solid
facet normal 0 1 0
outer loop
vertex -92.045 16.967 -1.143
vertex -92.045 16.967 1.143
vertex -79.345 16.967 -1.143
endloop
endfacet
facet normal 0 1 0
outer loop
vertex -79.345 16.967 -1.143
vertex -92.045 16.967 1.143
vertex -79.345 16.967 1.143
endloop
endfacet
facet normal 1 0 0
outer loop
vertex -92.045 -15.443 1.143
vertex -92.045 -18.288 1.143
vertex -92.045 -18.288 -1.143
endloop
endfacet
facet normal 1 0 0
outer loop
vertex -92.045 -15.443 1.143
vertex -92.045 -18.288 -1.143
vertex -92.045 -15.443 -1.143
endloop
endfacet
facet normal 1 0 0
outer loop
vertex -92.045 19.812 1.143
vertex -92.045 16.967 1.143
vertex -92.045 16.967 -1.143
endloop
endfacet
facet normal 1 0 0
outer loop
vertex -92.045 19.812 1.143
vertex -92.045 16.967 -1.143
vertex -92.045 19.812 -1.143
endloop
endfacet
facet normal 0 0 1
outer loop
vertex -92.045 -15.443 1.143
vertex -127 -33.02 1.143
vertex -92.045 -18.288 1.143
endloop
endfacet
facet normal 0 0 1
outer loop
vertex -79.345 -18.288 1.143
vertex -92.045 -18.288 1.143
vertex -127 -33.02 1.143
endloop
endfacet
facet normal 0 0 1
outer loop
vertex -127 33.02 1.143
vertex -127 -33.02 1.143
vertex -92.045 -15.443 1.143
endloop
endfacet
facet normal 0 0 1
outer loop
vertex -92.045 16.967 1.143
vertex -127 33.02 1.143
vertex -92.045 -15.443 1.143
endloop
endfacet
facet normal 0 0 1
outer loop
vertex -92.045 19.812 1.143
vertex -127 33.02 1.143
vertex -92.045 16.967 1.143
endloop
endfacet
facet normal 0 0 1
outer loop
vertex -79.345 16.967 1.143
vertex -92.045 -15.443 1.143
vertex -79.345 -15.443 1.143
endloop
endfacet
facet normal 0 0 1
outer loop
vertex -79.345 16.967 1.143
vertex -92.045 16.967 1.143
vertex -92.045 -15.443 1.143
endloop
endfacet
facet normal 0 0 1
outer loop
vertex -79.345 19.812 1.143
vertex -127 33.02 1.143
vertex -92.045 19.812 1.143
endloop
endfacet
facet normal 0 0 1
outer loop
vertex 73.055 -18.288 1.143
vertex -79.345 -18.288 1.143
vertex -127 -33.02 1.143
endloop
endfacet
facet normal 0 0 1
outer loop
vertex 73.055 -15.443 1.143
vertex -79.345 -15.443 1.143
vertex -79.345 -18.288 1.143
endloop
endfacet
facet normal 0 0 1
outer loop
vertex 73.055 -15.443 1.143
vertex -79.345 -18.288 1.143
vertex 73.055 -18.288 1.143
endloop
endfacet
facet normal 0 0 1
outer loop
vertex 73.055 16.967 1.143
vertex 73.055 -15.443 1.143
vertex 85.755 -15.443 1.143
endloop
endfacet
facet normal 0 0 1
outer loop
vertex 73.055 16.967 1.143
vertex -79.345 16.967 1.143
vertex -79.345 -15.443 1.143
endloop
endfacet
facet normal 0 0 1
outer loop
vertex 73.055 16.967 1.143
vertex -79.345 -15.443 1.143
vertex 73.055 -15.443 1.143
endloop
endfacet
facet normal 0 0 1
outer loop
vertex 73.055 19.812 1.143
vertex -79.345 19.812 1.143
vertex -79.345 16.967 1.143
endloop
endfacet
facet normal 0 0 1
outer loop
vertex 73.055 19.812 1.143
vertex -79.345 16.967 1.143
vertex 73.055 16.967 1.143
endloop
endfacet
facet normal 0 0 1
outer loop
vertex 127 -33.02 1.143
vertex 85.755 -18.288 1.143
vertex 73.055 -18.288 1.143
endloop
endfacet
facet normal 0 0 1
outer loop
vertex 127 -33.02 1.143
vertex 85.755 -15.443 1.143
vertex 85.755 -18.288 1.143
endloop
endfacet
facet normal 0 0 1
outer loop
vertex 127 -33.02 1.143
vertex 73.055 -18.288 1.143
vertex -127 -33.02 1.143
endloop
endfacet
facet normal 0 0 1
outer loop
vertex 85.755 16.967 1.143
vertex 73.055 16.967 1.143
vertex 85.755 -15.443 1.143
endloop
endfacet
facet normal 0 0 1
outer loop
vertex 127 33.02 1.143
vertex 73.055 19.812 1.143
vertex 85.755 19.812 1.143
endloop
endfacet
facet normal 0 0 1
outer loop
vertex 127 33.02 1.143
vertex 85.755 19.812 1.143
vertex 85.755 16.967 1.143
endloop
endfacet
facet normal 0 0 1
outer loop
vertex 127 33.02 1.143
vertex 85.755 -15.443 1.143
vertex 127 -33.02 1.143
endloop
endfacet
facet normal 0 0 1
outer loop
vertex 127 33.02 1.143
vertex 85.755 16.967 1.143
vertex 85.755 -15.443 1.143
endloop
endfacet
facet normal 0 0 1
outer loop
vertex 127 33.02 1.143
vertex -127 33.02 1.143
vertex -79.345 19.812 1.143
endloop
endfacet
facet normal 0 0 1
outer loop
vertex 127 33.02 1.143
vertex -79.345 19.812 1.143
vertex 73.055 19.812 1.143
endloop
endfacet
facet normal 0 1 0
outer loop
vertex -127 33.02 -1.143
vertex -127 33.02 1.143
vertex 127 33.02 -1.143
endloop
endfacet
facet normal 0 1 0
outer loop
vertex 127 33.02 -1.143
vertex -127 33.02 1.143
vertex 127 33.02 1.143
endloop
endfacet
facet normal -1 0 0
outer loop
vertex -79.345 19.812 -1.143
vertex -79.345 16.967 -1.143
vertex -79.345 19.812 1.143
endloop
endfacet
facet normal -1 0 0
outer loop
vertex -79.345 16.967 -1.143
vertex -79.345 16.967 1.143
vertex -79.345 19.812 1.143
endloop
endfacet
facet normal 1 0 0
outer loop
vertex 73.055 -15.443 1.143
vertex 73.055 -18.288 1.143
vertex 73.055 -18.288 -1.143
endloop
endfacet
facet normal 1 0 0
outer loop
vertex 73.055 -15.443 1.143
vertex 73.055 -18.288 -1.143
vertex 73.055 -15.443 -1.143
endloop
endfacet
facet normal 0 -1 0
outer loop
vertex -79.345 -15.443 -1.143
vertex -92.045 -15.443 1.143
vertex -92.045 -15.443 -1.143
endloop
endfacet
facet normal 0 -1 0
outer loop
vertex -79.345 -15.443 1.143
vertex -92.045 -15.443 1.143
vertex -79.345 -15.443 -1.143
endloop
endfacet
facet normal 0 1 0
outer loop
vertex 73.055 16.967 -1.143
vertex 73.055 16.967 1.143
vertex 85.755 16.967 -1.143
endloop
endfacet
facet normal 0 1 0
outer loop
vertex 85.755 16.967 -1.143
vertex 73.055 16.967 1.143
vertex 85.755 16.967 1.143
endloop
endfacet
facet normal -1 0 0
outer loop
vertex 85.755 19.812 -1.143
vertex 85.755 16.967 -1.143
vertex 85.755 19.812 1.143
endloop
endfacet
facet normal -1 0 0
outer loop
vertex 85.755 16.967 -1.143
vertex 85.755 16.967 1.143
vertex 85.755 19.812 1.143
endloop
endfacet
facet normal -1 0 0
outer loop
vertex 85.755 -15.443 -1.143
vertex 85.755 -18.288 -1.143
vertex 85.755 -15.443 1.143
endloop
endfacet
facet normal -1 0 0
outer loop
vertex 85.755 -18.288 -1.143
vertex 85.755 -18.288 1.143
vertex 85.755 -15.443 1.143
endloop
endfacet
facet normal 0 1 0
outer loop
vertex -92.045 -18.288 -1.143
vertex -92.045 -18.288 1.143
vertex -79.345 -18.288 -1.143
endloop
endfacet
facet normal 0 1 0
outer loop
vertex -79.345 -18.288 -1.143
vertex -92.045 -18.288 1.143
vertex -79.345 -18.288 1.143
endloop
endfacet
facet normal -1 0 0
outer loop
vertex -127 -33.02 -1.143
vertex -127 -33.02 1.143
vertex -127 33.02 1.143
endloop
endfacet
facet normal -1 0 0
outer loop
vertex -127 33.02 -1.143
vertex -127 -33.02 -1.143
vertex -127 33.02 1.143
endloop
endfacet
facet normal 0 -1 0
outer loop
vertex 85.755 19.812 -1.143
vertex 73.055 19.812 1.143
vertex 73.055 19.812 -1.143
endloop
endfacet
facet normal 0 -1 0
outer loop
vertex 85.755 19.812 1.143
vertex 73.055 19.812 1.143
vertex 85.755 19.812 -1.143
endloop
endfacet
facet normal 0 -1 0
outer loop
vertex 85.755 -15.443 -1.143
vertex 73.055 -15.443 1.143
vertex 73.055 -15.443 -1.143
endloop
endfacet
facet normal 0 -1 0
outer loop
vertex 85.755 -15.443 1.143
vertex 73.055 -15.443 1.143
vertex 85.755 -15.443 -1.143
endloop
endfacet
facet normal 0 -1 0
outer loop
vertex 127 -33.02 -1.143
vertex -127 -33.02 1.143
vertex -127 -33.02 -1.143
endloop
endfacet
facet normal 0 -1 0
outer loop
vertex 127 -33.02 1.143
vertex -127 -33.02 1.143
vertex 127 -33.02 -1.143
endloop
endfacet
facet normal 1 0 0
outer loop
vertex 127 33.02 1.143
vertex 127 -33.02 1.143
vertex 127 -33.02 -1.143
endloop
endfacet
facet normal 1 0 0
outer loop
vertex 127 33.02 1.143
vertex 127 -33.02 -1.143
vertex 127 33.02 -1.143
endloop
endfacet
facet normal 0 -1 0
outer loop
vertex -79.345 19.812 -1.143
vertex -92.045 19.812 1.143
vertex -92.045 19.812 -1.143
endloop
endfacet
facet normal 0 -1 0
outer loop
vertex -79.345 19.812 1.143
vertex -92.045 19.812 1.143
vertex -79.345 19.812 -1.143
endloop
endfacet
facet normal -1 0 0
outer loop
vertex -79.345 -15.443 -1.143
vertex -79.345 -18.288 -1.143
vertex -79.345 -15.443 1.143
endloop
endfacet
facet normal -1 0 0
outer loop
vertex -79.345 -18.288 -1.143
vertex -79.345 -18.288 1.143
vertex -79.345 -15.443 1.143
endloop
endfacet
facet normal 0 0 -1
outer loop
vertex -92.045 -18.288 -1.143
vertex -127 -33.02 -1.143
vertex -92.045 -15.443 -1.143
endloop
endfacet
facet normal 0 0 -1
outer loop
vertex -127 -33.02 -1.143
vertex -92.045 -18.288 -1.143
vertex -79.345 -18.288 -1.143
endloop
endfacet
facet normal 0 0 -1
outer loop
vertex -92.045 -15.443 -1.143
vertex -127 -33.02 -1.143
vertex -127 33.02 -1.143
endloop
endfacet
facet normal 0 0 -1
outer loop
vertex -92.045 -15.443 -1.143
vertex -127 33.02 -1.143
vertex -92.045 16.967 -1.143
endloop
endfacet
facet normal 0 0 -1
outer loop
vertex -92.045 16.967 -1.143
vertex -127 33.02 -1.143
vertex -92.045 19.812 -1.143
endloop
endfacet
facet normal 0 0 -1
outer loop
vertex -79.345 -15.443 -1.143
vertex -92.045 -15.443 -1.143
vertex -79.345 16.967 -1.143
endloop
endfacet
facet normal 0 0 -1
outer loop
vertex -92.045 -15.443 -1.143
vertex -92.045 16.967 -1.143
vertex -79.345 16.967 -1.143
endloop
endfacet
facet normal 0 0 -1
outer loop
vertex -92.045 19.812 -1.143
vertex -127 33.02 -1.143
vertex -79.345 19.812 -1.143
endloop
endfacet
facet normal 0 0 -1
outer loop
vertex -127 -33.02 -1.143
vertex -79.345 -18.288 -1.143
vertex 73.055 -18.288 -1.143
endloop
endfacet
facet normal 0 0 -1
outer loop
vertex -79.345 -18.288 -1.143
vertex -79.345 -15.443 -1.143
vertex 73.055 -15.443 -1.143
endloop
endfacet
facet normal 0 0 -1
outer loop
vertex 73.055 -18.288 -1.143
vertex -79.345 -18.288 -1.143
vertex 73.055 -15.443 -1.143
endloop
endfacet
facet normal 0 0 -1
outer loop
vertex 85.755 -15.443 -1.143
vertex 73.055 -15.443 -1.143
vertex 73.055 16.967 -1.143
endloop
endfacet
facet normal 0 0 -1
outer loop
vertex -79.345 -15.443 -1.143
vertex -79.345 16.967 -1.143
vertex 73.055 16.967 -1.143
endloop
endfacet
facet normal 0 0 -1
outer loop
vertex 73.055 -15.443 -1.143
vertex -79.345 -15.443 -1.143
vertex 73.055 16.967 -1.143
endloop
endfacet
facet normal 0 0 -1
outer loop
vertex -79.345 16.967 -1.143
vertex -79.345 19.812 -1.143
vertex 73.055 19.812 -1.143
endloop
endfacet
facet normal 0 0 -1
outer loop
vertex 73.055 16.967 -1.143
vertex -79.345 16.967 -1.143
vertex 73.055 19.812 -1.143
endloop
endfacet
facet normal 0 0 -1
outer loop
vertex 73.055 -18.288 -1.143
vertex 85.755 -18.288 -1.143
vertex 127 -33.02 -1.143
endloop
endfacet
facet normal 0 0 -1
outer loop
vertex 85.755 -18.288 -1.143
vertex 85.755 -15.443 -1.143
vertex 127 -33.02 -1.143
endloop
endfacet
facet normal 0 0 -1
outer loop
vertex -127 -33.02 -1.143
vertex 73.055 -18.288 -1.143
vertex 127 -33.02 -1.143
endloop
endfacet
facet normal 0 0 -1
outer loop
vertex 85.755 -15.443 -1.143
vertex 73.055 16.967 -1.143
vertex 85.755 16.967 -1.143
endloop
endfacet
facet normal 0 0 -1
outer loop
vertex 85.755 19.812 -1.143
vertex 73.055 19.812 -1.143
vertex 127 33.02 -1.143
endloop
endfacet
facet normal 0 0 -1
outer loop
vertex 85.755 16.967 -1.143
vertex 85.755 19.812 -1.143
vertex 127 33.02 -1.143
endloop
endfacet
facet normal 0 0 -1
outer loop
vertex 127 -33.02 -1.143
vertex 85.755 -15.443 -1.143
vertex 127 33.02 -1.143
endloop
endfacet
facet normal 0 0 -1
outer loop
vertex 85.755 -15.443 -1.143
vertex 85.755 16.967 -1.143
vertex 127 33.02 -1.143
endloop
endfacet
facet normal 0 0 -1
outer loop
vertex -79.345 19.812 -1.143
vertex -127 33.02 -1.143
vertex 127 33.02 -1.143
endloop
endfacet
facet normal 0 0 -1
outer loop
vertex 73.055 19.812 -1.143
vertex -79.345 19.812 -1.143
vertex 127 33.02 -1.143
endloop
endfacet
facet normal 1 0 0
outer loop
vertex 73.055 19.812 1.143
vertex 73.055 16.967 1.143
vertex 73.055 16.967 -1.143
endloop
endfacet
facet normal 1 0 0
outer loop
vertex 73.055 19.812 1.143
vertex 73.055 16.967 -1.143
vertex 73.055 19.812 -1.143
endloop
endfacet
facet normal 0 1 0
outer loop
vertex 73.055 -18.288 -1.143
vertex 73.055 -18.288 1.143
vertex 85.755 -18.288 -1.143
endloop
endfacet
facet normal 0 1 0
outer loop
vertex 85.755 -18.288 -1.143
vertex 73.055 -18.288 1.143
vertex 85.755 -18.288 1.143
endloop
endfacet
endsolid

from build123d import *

# Parameters (mm, degrees)
F0_W     = 254
F0_H     = 66.04
F0_W_2   = 12.7
F0_H_2   = 2.8448
F1_DEPTH = 1.143


with BuildPart() as f1:
    # F0 (on Top) → F1 (new body, symmetric)
    with BuildSketch(Plane.XY):
        Rectangle(F0_W, F0_H)
        with Locations((-85.69452, -16.8656)):
            Rectangle(F0_W_2, F0_H_2, mode=Mode.SUBTRACT)
        with Locations((79.40548, -16.8656)):
            Rectangle(F0_W_2, F0_H_2, mode=Mode.SUBTRACT)
        with Locations((-85.69452, 18.3896)):
            Rectangle(F0_W_2, F0_H_2, mode=Mode.SUBTRACT)
        with Locations((79.40548, 18.3896)):
            Rectangle(F0_W_2, F0_H_2, mode=Mode.SUBTRACT)
    extrude(amount=F1_DEPTH, both=True)


solid = f1.part
